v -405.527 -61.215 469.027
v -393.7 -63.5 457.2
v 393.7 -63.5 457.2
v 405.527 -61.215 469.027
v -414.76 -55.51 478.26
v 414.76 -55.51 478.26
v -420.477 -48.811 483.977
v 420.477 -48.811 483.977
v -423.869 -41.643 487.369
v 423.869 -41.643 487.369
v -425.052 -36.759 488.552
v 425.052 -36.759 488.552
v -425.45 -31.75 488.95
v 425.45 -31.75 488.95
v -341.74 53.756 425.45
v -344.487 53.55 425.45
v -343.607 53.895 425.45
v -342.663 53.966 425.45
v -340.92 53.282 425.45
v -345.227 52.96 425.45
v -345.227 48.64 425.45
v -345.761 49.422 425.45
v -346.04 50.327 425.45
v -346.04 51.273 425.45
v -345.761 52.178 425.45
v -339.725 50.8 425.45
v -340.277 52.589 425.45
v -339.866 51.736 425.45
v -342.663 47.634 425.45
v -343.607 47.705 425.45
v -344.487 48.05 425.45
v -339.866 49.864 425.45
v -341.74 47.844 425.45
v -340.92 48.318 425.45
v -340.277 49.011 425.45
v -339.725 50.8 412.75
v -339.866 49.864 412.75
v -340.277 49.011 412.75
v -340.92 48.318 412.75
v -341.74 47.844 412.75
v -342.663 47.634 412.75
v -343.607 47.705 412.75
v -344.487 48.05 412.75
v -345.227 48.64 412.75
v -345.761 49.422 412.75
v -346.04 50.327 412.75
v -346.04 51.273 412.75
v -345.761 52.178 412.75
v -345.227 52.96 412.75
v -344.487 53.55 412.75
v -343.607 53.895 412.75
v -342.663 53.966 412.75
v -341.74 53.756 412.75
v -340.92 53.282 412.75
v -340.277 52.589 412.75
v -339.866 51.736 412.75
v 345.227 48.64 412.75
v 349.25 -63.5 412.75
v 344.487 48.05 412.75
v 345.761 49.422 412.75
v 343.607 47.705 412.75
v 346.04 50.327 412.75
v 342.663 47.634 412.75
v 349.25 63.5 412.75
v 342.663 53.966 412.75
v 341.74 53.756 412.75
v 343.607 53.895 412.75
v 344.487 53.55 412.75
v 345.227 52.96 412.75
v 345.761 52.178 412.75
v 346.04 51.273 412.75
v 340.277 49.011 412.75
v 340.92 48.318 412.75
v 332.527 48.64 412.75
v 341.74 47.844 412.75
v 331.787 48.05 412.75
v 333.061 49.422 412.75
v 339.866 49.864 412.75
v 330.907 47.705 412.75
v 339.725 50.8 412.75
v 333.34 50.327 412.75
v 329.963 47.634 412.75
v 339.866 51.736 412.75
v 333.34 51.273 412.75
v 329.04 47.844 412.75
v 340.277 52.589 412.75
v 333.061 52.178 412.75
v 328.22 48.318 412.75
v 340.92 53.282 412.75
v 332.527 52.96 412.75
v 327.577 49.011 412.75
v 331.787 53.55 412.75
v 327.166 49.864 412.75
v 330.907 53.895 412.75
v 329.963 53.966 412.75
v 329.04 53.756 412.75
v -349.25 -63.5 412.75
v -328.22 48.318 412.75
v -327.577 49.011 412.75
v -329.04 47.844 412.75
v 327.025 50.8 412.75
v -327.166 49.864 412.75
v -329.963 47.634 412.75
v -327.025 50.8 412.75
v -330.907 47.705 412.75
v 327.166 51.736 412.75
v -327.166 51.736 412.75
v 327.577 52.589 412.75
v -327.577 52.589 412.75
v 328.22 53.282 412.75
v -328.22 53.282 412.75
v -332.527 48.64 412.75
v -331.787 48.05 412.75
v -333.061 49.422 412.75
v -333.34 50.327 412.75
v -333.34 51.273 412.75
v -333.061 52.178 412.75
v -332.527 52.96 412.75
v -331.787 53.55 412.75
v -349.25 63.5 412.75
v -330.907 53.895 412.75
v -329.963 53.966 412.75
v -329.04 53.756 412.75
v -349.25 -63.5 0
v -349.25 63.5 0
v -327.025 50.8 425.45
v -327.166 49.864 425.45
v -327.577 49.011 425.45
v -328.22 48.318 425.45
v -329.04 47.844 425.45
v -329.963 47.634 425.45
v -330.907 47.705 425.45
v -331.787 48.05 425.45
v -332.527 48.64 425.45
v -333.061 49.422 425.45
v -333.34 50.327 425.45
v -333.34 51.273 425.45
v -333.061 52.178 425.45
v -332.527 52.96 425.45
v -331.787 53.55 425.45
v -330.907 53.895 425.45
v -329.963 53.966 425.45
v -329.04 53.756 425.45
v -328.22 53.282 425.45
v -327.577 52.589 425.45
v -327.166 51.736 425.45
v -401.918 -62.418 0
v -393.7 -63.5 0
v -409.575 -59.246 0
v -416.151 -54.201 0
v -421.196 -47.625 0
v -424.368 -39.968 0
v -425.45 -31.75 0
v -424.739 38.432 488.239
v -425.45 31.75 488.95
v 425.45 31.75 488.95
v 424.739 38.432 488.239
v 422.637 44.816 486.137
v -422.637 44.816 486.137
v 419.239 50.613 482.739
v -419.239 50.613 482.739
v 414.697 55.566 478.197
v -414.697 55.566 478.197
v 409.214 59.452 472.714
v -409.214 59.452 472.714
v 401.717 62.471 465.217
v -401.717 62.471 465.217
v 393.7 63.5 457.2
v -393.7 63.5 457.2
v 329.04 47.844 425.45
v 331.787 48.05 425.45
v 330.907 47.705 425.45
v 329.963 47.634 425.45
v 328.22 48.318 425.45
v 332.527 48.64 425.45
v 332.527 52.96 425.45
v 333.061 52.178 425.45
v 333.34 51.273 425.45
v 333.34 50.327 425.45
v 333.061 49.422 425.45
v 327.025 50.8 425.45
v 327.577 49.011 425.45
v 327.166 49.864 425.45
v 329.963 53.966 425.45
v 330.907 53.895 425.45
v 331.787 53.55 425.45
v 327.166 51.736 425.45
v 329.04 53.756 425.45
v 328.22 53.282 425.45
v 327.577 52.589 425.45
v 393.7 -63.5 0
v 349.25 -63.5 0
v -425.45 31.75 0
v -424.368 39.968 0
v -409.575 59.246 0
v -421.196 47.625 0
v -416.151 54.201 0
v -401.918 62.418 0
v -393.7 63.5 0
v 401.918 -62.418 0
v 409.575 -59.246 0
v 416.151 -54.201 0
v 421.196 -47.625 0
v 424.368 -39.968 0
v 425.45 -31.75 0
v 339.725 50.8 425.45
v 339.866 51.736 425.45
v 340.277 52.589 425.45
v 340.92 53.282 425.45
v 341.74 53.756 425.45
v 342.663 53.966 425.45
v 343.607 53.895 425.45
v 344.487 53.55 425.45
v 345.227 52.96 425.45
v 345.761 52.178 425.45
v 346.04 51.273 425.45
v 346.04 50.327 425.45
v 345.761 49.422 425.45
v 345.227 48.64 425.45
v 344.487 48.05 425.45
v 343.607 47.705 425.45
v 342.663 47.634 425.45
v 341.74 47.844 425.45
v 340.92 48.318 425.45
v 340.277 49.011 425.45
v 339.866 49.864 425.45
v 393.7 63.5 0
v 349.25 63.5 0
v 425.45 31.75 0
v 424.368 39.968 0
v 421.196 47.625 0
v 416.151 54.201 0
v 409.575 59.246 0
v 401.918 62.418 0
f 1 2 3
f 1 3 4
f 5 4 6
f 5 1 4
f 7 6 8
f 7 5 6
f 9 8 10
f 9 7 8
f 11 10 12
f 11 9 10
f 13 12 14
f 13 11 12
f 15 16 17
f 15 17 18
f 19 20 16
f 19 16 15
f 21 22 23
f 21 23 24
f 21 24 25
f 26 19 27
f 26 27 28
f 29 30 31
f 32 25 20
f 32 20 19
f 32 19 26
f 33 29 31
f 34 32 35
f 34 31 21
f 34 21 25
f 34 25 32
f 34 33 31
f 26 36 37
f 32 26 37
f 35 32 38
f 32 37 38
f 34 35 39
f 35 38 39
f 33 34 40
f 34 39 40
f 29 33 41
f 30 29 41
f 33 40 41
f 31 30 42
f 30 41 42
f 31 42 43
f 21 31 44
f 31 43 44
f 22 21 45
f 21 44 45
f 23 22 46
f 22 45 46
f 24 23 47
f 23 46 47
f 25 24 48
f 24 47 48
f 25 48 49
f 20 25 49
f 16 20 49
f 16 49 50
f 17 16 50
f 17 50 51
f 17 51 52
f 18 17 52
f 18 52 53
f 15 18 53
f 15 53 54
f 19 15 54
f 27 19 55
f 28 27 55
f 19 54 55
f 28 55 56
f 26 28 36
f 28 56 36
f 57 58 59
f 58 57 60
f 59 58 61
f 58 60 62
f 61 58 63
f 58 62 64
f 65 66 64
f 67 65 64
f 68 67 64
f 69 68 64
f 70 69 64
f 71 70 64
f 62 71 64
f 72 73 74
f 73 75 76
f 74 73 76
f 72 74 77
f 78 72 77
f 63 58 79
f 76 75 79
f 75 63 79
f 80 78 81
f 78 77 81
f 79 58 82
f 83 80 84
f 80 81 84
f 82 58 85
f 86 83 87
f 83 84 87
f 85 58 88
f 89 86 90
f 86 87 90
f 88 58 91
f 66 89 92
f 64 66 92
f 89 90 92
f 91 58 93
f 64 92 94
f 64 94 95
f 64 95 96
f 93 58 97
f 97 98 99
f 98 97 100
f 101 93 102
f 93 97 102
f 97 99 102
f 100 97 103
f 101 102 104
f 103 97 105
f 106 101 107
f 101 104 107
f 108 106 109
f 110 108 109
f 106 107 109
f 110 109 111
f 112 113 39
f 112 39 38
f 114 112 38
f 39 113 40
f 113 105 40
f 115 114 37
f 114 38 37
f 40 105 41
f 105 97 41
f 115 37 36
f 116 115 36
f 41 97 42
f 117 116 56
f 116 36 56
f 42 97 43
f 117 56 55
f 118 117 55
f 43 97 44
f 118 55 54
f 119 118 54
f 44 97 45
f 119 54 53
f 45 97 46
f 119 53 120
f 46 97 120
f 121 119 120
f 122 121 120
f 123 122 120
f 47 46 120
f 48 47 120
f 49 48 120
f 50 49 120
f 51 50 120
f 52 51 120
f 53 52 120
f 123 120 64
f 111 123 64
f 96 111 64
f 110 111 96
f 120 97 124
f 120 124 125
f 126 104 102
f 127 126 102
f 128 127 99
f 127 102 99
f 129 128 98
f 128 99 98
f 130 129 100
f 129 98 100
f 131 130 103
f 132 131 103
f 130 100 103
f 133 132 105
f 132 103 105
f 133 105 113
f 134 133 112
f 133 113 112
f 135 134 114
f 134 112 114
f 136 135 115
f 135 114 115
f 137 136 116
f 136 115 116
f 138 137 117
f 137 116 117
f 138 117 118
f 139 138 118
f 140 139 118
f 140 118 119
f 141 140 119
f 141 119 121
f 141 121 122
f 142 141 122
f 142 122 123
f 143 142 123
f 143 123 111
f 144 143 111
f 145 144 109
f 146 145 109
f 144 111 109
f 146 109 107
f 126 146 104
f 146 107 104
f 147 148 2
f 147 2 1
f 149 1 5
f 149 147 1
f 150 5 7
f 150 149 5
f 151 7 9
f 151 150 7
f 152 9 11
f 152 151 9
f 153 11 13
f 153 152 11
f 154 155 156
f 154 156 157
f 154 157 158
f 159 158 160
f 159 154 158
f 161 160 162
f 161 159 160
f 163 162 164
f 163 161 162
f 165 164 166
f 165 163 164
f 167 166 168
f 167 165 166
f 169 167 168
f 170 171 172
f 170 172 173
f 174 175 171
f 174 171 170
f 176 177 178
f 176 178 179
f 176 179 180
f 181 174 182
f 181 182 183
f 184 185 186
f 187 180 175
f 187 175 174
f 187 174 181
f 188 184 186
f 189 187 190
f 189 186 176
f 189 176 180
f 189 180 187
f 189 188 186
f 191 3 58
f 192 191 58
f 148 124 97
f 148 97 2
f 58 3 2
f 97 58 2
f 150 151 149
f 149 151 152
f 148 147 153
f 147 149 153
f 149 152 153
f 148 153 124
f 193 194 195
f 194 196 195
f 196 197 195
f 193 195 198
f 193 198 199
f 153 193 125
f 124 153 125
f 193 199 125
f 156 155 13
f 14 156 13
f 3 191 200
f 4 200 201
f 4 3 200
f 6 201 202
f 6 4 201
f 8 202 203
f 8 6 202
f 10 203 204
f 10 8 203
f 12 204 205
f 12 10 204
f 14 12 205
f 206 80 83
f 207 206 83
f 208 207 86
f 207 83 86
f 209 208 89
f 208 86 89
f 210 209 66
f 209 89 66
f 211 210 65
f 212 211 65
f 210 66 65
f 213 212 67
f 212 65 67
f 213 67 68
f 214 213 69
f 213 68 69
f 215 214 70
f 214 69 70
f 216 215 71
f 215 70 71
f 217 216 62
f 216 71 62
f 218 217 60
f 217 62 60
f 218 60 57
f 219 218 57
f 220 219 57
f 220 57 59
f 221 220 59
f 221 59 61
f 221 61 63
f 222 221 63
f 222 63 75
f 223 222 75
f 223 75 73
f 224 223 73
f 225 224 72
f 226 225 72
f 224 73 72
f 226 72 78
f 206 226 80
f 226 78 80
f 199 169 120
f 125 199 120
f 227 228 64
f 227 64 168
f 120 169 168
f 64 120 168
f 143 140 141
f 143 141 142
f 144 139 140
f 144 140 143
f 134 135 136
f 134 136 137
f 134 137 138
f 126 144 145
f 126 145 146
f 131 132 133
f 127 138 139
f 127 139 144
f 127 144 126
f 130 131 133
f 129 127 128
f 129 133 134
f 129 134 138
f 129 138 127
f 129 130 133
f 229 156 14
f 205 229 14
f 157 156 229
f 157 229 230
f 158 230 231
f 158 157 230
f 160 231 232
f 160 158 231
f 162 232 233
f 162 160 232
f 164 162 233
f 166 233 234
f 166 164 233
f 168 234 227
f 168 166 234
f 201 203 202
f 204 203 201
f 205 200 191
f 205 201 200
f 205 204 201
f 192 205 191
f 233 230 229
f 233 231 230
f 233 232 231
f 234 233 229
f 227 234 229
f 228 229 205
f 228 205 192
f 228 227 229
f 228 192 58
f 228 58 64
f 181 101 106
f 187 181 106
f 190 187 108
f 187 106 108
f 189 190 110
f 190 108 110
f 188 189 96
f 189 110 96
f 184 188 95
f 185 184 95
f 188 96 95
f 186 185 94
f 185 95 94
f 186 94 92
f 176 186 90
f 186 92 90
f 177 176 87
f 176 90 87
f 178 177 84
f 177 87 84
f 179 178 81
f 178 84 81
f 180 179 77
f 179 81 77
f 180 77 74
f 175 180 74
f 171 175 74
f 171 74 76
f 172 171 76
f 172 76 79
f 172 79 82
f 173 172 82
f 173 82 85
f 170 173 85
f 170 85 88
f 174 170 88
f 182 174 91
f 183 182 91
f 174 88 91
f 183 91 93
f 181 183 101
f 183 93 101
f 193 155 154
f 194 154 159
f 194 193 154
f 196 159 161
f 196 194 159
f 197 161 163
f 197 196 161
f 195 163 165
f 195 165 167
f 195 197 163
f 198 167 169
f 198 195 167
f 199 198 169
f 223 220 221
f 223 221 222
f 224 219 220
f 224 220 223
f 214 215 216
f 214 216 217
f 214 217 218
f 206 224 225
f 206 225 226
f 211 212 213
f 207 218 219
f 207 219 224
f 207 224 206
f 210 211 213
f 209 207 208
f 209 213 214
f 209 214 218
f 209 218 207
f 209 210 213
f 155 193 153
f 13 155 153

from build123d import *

# Parameters (mm, degrees)
SKETCH4_R          = 3.175
CUT_EXTRUDE1_DEPTH = 12.7


with BuildPart() as part:
    # Sweep1: sweep along a path in Sketch3
    with BuildLine(Plane(origin=(0, 0, 0), x_dir=(1, 0, 0), z_dir=(0, 1, 0))) as sweep1_path:
        Line((349.25, 0), (349.25, -412.75))
        Line((349.25, -412.75), (-349.25, -412.75))
        Line((-349.25, -412.75), (-349.25, 0))
    # Sketch2 → Sweep1 (sweep)
    with BuildSketch(Plane.XY):
        with BuildLine():
            Line((-349.25, 63.5), (-393.7, 63.5))
            ThreePointArc((-393.7, 63.5), (-416.150640303, 54.200640303), (-425.45, 31.75))
            Line((-425.45, 31.75), (-425.45, -31.75))
            ThreePointArc((-425.45, -31.75), (-416.150640303, -54.200640303), (-393.7, -63.5))
            Line((-393.7, -63.5), (-349.25, -63.5))
            Line((-349.25, -63.5), (-349.25, 63.5))
        make_face()
    sweep(path=sweep1_path.line, transition=Transition.RIGHT)

    # Sketch4 → Cut-Extrude1 (cut)
    with BuildSketch(Plane(origin=(0, 0, 412.75), x_dir=(-1, 0, 0), z_dir=(0, 0, -1))):
        with Locations((-342.9, 50.8)):
            Circle(SKETCH4_R)
        with Locations((-330.2, 50.8)):
            Circle(SKETCH4_R)
        with Locations(Location((330.2, 50.8, 0), (0, 0, 180))):
            Circle(SKETCH4_R)
        with Locations(Location((342.9, 50.8, 0), (0, 0, 180))):
            Circle(SKETCH4_R)
    extrude(amount=-CUT_EXTRUDE1_DEPTH, mode=Mode.SUBTRACT)


solid = part.part
